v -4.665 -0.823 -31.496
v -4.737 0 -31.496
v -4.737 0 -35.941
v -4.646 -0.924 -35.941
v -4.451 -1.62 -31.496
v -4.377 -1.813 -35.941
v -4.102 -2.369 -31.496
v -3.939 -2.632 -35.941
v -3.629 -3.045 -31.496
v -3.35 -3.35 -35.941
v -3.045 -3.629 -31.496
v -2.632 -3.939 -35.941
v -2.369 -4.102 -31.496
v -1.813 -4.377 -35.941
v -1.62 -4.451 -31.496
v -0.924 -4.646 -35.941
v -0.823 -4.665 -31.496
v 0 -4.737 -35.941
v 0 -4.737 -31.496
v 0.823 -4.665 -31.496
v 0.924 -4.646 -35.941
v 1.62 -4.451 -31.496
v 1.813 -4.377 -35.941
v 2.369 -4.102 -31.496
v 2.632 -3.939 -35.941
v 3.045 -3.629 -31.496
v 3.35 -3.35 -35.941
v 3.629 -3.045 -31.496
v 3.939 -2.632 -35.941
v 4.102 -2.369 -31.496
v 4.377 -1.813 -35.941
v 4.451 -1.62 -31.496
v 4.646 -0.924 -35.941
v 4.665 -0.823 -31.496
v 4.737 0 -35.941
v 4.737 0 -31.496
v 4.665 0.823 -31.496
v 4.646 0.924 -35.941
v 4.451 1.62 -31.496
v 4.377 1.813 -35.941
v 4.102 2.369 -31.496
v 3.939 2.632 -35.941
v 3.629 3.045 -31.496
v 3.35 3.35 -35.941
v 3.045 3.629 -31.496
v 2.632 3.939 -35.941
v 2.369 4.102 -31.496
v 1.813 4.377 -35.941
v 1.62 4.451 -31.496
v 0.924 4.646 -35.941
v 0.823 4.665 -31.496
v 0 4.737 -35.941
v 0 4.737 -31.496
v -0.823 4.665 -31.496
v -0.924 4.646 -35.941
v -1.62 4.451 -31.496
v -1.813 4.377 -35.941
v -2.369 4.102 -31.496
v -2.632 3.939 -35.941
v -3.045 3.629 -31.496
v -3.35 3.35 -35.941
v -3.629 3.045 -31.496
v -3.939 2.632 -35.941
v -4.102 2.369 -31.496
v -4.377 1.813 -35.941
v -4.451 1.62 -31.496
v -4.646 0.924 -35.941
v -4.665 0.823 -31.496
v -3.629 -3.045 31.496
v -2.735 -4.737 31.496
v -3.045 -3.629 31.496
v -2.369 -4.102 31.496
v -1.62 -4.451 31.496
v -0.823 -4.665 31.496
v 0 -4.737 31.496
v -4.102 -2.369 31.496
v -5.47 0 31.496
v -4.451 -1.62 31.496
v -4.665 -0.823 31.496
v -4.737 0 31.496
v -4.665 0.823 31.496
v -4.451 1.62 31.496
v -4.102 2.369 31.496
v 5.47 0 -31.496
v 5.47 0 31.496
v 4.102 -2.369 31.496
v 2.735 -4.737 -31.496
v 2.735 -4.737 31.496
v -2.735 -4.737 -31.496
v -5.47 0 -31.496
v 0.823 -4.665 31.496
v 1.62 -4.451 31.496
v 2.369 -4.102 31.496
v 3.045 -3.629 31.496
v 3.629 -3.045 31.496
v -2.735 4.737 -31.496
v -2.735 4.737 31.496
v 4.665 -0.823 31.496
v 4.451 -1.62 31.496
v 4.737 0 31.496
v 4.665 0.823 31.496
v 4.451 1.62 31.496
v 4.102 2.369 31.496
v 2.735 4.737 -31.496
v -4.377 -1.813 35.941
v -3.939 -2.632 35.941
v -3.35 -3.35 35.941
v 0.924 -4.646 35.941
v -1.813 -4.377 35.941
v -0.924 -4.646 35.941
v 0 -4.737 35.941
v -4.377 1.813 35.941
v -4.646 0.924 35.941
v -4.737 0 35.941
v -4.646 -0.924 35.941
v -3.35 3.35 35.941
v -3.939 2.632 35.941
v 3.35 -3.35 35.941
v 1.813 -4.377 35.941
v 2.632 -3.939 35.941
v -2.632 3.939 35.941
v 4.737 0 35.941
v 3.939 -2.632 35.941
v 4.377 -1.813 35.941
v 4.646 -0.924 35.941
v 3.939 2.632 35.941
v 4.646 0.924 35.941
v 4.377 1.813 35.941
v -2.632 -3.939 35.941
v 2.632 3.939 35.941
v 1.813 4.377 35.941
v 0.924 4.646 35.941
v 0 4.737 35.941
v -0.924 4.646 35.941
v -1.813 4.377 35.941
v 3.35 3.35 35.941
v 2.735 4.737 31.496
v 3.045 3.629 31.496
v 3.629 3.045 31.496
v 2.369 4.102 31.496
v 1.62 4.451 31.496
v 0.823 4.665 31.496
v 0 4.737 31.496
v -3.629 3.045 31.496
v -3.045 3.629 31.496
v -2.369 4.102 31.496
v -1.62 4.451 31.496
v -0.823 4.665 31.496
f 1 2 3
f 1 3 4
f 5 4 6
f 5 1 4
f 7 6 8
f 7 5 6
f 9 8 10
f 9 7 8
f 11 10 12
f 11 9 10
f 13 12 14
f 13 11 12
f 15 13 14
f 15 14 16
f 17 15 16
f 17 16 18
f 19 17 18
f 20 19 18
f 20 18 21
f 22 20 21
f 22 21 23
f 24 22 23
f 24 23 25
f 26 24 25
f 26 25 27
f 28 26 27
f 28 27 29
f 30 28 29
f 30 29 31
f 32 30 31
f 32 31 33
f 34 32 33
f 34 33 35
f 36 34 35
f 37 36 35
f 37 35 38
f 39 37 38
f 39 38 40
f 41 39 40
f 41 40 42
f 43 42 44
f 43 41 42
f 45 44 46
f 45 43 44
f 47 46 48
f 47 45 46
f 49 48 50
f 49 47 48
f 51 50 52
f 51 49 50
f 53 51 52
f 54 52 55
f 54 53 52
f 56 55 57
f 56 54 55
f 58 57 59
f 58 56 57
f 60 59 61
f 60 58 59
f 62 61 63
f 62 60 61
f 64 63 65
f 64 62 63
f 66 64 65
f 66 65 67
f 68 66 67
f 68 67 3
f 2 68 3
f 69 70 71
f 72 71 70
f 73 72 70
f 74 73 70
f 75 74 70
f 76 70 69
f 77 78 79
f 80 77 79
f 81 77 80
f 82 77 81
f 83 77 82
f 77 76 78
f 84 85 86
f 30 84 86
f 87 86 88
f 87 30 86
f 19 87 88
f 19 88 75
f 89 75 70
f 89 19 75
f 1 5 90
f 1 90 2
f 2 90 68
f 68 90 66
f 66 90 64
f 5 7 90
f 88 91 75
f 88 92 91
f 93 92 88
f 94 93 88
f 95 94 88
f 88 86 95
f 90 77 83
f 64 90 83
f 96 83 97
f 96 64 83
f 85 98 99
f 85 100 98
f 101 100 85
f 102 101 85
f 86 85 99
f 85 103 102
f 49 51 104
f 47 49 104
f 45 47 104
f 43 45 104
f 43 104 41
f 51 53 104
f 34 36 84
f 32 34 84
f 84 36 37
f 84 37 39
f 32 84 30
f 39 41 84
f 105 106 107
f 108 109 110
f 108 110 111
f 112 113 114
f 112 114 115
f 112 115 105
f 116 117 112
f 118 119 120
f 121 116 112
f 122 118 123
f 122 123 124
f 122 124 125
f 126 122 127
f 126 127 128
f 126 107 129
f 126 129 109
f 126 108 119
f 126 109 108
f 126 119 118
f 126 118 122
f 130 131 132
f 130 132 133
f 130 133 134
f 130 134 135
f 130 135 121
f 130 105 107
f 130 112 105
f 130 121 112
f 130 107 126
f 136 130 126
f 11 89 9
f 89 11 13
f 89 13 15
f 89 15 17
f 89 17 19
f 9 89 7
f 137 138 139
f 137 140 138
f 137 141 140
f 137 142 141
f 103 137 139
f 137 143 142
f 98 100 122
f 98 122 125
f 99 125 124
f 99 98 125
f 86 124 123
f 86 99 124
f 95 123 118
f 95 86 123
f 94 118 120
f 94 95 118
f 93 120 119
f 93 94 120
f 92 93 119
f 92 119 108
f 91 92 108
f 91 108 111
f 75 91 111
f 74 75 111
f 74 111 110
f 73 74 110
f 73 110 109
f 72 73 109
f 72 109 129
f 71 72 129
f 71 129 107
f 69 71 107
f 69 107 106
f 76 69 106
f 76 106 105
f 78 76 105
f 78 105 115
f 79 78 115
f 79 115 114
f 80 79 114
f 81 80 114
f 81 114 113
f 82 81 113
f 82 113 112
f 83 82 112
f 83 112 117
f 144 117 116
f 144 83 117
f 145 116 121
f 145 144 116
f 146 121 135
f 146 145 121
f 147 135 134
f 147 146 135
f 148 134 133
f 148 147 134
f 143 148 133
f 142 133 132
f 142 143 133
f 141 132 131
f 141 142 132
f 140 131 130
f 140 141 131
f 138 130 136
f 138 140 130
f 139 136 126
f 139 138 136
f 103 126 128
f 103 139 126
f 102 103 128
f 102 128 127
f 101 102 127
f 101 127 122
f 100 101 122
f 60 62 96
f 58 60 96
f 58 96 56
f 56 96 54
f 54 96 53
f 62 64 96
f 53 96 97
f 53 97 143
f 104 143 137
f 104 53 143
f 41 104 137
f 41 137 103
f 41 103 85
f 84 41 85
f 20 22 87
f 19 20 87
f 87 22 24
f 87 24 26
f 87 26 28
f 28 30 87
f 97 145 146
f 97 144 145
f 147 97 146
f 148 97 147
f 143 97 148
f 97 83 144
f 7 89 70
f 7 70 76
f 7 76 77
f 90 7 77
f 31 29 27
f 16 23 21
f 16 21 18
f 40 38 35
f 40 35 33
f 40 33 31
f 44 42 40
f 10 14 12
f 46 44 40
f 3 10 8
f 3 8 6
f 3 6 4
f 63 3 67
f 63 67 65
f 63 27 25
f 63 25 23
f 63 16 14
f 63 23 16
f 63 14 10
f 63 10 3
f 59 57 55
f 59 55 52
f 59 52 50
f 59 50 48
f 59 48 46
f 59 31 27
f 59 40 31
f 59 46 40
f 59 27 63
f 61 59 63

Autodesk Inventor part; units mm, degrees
ref_plane "YZ Plane" through (0, 0, 0) normal (1, 0, 0) x (0, 1, 0)
ref_plane "XZ Plane" through (0, 0, 0) normal (0, 1, 0) x (-1, 0, 0)
ref_plane "XY Plane" through (0, 0, 0) normal (0, 0, 1) x (1, 0, 0)
sketch "Sketch1" plane through (0, 0, 0) normal (0, 0, 1) x (1, 0, 0)
  line L0 (-2.735, 4.7371) -> (2.735, 4.7371)
  line L1 (2.735, 4.7371) -> (5.4699, 0)
  line L2 (5.4699, 0) -> (2.735, -4.7371)
  line L3 (2.735, -4.7371) -> (-2.735, -4.7371)
  line L4 (-2.735, -4.7371) -> (-5.4699, 0)
  line L5 (-5.4699, 0) -> (-2.735, 4.7371)
  point P0 (0, 0)
  point P1 (0, 0)
  dimension "d0" = 9.4742
extrude "Extrusion1" add sketch "Sketch1" along normal mid plane 62.992
sketch "Sketch2" plane through (0, 0, 31.496) normal (0, 0, 1) x (1, 0, 0)
  circle A0 centre (0, 0) radius 4.7371
  dimension "d3" = 9.4742
extrude "Extrusion2" add sketch "Sketch2" along normal blind 4.445
sketch "Sketch3" plane through (0, 0, -31.496) normal (0, 0, -1) x (-1, 0, 0)
  circle A0 centre (0, 0) radius 4.7371
  dimension "d6" = 9.4742
extrude "Extrusion3" add sketch "Sketch3" along normal blind 4.445
properties part number "AM shifter new input shaft" material "Steel"
